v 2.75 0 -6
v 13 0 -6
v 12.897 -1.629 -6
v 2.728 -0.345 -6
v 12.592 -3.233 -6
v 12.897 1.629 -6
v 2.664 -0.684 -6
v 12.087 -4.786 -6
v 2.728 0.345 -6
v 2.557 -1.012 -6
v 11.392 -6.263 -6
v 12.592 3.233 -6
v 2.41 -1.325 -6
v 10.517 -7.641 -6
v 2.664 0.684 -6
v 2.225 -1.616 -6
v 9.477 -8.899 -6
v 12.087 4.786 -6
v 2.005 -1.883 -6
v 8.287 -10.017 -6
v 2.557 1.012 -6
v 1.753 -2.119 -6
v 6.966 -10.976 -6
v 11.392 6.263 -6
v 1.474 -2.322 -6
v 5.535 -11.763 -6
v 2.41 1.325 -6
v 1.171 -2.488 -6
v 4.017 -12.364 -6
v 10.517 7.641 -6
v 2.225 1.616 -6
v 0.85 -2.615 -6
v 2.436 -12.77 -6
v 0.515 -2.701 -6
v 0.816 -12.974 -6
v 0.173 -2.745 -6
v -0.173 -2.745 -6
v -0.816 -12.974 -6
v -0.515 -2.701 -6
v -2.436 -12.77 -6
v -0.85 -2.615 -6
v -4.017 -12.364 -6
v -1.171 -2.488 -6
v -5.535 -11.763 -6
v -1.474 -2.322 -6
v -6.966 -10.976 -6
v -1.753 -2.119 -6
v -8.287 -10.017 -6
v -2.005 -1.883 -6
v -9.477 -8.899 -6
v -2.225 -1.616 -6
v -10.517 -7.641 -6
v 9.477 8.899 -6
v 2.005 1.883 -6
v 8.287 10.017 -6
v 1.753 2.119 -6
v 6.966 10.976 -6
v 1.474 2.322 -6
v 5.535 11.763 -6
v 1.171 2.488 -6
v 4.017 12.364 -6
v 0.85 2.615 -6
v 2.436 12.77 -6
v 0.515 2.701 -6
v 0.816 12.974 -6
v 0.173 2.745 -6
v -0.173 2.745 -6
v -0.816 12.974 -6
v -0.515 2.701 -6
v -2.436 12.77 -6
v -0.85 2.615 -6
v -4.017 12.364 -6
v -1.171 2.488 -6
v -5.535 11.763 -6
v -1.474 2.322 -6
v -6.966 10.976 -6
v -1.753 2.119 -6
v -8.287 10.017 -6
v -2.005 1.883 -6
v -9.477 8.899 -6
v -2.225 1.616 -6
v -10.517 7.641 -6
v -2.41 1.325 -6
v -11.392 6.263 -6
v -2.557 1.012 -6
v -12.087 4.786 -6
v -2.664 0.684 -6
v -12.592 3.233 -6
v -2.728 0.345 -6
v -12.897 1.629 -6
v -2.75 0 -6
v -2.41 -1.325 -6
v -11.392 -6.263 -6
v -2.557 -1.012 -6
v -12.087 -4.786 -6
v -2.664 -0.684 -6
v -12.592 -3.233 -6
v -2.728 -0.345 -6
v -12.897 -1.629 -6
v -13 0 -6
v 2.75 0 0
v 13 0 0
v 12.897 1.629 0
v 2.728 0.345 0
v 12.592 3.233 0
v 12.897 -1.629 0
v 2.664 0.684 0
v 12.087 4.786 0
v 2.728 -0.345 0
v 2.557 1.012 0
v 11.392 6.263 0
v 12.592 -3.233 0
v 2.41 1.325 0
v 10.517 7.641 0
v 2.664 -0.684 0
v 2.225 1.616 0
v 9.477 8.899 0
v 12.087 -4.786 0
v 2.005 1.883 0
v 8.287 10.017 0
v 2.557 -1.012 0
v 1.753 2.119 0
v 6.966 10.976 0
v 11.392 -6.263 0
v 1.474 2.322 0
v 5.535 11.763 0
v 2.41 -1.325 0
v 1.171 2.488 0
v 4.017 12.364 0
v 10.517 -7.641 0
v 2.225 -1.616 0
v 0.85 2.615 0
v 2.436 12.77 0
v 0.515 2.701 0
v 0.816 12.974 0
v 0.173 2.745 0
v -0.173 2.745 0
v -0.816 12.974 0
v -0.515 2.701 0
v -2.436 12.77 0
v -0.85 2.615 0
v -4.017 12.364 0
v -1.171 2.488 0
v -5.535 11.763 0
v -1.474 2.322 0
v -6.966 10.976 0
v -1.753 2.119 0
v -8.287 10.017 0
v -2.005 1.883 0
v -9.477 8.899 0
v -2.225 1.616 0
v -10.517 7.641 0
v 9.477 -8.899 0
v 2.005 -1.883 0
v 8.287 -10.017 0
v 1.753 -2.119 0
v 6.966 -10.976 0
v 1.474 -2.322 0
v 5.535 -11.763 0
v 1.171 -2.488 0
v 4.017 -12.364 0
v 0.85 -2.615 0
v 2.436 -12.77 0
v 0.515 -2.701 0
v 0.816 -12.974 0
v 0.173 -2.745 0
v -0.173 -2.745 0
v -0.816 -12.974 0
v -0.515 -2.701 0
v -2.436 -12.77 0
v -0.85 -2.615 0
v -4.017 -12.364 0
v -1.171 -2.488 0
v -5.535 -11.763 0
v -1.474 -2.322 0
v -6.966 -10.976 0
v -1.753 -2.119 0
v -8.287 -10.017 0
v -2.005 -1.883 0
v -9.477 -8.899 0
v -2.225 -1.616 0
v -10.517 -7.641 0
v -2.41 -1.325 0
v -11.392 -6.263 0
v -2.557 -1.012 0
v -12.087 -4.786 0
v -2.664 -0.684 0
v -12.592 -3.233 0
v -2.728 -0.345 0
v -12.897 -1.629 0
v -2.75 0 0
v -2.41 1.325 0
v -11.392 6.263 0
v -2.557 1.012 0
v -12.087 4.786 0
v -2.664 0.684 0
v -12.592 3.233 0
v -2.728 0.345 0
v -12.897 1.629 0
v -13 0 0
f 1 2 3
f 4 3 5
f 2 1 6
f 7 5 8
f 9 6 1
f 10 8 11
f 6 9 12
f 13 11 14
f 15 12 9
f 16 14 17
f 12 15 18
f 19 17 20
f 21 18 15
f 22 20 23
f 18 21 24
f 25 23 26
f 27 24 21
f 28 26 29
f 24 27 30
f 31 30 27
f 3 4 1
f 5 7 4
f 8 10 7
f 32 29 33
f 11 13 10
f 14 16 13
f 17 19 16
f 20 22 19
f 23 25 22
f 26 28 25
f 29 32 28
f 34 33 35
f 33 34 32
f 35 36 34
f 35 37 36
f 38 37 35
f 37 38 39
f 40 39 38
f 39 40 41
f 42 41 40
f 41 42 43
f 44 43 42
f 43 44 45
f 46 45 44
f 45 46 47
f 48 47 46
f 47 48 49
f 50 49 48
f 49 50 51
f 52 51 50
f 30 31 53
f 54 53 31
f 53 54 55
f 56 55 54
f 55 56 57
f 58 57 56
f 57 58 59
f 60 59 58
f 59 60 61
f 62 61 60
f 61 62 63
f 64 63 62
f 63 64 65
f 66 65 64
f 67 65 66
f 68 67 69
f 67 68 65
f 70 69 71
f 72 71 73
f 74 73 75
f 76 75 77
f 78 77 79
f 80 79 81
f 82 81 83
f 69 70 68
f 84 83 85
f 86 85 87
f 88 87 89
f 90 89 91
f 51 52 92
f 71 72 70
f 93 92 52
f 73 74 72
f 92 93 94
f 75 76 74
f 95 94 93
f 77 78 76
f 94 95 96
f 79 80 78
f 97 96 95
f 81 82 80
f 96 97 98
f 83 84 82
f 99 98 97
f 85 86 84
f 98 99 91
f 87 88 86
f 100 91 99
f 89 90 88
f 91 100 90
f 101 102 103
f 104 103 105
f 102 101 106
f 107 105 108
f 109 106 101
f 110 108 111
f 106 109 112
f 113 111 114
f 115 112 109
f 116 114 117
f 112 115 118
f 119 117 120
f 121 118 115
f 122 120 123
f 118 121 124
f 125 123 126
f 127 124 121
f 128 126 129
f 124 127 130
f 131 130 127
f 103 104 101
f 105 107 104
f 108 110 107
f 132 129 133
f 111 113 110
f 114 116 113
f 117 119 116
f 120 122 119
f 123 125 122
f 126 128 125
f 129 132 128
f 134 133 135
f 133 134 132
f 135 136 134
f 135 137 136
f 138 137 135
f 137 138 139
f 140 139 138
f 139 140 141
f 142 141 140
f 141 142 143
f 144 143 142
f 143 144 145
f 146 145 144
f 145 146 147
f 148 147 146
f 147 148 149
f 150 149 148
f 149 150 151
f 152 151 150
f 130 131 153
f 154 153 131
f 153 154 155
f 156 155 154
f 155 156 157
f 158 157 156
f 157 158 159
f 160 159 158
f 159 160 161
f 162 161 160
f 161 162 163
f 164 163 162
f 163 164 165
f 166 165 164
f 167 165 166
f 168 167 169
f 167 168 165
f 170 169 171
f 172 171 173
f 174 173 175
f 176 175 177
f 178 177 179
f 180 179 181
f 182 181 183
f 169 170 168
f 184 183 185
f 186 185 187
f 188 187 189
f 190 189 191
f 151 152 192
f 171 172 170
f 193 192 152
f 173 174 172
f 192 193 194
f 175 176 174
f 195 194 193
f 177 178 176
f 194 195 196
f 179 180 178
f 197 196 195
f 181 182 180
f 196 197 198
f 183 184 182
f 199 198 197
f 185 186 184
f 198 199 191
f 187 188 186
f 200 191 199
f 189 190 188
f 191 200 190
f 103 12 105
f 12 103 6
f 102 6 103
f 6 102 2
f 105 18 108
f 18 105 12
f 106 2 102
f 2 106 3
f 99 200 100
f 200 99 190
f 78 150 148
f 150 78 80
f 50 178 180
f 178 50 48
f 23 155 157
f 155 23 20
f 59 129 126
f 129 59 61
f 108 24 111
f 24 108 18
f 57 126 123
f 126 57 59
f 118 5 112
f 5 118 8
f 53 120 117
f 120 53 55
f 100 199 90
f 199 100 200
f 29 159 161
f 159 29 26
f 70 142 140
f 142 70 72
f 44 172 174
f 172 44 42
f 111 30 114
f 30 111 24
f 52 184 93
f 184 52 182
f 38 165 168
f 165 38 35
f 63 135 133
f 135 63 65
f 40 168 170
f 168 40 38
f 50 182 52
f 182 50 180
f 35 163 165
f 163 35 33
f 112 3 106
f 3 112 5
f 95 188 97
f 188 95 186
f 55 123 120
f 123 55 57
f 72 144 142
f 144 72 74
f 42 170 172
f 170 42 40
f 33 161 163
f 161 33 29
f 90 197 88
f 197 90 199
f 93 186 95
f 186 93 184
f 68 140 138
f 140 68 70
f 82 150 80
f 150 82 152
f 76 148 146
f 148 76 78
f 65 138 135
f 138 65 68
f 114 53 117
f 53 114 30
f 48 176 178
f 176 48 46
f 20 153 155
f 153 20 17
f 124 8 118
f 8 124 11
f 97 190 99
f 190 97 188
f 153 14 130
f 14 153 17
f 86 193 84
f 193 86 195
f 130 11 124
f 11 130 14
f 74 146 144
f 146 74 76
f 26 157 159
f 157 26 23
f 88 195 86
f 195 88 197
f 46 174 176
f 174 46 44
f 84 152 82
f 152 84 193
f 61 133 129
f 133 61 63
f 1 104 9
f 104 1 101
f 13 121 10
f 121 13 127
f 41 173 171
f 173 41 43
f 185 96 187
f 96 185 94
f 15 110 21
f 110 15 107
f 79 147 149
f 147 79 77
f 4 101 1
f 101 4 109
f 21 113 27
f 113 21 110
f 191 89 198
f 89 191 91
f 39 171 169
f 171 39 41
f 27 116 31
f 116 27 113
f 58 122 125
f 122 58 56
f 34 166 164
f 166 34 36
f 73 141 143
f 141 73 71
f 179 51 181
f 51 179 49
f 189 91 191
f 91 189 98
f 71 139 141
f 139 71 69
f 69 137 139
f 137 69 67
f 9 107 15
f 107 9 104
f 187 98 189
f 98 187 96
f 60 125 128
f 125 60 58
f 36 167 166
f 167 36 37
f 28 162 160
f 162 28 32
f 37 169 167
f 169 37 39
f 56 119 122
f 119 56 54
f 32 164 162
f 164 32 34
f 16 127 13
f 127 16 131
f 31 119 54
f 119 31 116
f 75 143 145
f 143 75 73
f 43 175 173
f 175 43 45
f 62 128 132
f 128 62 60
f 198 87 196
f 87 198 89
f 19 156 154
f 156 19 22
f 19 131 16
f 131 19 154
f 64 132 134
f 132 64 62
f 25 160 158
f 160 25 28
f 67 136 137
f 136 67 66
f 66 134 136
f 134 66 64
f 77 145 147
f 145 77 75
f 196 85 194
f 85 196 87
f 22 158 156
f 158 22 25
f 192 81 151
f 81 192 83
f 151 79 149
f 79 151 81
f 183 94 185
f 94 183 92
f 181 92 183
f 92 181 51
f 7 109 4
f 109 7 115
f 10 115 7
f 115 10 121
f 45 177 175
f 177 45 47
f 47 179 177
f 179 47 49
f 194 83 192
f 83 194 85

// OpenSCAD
$fn = 50;


difference() {
	union() {
		translate(v = [0, 0, -6.0000000000]) {
			cylinder(h = 6, r = 7.0000000000);
		}
		translate(v = [0, 0, -6.0000000000]) {
			cylinder(h = 6, r = 13.0000000000);
		}
	}
	union() {
		#translate(v = [0, 0, -6]) {
			cylinder(h = 6, r = 2.7500000000);
		}
	}
}
